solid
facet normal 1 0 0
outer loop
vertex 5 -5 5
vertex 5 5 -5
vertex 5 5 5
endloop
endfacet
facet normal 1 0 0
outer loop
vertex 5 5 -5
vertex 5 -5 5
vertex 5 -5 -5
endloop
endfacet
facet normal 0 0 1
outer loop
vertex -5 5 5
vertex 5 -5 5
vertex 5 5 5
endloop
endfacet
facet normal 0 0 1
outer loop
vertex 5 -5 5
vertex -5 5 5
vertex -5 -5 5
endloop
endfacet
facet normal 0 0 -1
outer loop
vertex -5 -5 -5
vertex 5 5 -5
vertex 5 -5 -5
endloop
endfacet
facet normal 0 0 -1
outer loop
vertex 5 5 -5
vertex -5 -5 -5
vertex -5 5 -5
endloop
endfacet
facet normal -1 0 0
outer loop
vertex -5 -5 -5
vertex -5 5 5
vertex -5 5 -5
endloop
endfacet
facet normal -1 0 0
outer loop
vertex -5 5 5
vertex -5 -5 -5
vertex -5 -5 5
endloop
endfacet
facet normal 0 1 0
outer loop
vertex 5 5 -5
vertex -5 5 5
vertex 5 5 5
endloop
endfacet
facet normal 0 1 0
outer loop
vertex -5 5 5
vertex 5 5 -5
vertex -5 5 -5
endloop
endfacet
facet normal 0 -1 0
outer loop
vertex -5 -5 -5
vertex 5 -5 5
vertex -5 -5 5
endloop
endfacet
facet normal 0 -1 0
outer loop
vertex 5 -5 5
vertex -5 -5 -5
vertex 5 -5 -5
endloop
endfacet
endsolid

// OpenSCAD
module hyperboloid(h=10,r0=2,r1=5,fn=100){
    #cube([r1*2,r1*2,h], center=true);
    points = concat([ for (z = [-.5:1/fn:.5]) [sqrt(4*(r1^2-r0^2)*(z^2)+r0*r0), z*h] ], [ [0, .5*h], [0, -.5*h] ]);
    rotate_extrude($fn = fn) polygon(points);
}
module hollow_hyperboloid(h=10,r0=3,r1=5,t=1,fn=100){
    #cube([r1*2,r1*2,h], center=true);
    points = concat(
        [ for (z = [-.5:1/fn:.5]) [sqrt(4*(r1^2-r0^2)*(z^2)+r0*r0), z*h] ],
        [ for (z = [.5:-1/fn:-.5]) [sqrt(4*(r1^2-r0^2)*(z^2)+r0*r0)-t, z*h] ]
    );
    rotate_extrude($fn = fn) polygon(points);
}

hollow_hyperboloid();
